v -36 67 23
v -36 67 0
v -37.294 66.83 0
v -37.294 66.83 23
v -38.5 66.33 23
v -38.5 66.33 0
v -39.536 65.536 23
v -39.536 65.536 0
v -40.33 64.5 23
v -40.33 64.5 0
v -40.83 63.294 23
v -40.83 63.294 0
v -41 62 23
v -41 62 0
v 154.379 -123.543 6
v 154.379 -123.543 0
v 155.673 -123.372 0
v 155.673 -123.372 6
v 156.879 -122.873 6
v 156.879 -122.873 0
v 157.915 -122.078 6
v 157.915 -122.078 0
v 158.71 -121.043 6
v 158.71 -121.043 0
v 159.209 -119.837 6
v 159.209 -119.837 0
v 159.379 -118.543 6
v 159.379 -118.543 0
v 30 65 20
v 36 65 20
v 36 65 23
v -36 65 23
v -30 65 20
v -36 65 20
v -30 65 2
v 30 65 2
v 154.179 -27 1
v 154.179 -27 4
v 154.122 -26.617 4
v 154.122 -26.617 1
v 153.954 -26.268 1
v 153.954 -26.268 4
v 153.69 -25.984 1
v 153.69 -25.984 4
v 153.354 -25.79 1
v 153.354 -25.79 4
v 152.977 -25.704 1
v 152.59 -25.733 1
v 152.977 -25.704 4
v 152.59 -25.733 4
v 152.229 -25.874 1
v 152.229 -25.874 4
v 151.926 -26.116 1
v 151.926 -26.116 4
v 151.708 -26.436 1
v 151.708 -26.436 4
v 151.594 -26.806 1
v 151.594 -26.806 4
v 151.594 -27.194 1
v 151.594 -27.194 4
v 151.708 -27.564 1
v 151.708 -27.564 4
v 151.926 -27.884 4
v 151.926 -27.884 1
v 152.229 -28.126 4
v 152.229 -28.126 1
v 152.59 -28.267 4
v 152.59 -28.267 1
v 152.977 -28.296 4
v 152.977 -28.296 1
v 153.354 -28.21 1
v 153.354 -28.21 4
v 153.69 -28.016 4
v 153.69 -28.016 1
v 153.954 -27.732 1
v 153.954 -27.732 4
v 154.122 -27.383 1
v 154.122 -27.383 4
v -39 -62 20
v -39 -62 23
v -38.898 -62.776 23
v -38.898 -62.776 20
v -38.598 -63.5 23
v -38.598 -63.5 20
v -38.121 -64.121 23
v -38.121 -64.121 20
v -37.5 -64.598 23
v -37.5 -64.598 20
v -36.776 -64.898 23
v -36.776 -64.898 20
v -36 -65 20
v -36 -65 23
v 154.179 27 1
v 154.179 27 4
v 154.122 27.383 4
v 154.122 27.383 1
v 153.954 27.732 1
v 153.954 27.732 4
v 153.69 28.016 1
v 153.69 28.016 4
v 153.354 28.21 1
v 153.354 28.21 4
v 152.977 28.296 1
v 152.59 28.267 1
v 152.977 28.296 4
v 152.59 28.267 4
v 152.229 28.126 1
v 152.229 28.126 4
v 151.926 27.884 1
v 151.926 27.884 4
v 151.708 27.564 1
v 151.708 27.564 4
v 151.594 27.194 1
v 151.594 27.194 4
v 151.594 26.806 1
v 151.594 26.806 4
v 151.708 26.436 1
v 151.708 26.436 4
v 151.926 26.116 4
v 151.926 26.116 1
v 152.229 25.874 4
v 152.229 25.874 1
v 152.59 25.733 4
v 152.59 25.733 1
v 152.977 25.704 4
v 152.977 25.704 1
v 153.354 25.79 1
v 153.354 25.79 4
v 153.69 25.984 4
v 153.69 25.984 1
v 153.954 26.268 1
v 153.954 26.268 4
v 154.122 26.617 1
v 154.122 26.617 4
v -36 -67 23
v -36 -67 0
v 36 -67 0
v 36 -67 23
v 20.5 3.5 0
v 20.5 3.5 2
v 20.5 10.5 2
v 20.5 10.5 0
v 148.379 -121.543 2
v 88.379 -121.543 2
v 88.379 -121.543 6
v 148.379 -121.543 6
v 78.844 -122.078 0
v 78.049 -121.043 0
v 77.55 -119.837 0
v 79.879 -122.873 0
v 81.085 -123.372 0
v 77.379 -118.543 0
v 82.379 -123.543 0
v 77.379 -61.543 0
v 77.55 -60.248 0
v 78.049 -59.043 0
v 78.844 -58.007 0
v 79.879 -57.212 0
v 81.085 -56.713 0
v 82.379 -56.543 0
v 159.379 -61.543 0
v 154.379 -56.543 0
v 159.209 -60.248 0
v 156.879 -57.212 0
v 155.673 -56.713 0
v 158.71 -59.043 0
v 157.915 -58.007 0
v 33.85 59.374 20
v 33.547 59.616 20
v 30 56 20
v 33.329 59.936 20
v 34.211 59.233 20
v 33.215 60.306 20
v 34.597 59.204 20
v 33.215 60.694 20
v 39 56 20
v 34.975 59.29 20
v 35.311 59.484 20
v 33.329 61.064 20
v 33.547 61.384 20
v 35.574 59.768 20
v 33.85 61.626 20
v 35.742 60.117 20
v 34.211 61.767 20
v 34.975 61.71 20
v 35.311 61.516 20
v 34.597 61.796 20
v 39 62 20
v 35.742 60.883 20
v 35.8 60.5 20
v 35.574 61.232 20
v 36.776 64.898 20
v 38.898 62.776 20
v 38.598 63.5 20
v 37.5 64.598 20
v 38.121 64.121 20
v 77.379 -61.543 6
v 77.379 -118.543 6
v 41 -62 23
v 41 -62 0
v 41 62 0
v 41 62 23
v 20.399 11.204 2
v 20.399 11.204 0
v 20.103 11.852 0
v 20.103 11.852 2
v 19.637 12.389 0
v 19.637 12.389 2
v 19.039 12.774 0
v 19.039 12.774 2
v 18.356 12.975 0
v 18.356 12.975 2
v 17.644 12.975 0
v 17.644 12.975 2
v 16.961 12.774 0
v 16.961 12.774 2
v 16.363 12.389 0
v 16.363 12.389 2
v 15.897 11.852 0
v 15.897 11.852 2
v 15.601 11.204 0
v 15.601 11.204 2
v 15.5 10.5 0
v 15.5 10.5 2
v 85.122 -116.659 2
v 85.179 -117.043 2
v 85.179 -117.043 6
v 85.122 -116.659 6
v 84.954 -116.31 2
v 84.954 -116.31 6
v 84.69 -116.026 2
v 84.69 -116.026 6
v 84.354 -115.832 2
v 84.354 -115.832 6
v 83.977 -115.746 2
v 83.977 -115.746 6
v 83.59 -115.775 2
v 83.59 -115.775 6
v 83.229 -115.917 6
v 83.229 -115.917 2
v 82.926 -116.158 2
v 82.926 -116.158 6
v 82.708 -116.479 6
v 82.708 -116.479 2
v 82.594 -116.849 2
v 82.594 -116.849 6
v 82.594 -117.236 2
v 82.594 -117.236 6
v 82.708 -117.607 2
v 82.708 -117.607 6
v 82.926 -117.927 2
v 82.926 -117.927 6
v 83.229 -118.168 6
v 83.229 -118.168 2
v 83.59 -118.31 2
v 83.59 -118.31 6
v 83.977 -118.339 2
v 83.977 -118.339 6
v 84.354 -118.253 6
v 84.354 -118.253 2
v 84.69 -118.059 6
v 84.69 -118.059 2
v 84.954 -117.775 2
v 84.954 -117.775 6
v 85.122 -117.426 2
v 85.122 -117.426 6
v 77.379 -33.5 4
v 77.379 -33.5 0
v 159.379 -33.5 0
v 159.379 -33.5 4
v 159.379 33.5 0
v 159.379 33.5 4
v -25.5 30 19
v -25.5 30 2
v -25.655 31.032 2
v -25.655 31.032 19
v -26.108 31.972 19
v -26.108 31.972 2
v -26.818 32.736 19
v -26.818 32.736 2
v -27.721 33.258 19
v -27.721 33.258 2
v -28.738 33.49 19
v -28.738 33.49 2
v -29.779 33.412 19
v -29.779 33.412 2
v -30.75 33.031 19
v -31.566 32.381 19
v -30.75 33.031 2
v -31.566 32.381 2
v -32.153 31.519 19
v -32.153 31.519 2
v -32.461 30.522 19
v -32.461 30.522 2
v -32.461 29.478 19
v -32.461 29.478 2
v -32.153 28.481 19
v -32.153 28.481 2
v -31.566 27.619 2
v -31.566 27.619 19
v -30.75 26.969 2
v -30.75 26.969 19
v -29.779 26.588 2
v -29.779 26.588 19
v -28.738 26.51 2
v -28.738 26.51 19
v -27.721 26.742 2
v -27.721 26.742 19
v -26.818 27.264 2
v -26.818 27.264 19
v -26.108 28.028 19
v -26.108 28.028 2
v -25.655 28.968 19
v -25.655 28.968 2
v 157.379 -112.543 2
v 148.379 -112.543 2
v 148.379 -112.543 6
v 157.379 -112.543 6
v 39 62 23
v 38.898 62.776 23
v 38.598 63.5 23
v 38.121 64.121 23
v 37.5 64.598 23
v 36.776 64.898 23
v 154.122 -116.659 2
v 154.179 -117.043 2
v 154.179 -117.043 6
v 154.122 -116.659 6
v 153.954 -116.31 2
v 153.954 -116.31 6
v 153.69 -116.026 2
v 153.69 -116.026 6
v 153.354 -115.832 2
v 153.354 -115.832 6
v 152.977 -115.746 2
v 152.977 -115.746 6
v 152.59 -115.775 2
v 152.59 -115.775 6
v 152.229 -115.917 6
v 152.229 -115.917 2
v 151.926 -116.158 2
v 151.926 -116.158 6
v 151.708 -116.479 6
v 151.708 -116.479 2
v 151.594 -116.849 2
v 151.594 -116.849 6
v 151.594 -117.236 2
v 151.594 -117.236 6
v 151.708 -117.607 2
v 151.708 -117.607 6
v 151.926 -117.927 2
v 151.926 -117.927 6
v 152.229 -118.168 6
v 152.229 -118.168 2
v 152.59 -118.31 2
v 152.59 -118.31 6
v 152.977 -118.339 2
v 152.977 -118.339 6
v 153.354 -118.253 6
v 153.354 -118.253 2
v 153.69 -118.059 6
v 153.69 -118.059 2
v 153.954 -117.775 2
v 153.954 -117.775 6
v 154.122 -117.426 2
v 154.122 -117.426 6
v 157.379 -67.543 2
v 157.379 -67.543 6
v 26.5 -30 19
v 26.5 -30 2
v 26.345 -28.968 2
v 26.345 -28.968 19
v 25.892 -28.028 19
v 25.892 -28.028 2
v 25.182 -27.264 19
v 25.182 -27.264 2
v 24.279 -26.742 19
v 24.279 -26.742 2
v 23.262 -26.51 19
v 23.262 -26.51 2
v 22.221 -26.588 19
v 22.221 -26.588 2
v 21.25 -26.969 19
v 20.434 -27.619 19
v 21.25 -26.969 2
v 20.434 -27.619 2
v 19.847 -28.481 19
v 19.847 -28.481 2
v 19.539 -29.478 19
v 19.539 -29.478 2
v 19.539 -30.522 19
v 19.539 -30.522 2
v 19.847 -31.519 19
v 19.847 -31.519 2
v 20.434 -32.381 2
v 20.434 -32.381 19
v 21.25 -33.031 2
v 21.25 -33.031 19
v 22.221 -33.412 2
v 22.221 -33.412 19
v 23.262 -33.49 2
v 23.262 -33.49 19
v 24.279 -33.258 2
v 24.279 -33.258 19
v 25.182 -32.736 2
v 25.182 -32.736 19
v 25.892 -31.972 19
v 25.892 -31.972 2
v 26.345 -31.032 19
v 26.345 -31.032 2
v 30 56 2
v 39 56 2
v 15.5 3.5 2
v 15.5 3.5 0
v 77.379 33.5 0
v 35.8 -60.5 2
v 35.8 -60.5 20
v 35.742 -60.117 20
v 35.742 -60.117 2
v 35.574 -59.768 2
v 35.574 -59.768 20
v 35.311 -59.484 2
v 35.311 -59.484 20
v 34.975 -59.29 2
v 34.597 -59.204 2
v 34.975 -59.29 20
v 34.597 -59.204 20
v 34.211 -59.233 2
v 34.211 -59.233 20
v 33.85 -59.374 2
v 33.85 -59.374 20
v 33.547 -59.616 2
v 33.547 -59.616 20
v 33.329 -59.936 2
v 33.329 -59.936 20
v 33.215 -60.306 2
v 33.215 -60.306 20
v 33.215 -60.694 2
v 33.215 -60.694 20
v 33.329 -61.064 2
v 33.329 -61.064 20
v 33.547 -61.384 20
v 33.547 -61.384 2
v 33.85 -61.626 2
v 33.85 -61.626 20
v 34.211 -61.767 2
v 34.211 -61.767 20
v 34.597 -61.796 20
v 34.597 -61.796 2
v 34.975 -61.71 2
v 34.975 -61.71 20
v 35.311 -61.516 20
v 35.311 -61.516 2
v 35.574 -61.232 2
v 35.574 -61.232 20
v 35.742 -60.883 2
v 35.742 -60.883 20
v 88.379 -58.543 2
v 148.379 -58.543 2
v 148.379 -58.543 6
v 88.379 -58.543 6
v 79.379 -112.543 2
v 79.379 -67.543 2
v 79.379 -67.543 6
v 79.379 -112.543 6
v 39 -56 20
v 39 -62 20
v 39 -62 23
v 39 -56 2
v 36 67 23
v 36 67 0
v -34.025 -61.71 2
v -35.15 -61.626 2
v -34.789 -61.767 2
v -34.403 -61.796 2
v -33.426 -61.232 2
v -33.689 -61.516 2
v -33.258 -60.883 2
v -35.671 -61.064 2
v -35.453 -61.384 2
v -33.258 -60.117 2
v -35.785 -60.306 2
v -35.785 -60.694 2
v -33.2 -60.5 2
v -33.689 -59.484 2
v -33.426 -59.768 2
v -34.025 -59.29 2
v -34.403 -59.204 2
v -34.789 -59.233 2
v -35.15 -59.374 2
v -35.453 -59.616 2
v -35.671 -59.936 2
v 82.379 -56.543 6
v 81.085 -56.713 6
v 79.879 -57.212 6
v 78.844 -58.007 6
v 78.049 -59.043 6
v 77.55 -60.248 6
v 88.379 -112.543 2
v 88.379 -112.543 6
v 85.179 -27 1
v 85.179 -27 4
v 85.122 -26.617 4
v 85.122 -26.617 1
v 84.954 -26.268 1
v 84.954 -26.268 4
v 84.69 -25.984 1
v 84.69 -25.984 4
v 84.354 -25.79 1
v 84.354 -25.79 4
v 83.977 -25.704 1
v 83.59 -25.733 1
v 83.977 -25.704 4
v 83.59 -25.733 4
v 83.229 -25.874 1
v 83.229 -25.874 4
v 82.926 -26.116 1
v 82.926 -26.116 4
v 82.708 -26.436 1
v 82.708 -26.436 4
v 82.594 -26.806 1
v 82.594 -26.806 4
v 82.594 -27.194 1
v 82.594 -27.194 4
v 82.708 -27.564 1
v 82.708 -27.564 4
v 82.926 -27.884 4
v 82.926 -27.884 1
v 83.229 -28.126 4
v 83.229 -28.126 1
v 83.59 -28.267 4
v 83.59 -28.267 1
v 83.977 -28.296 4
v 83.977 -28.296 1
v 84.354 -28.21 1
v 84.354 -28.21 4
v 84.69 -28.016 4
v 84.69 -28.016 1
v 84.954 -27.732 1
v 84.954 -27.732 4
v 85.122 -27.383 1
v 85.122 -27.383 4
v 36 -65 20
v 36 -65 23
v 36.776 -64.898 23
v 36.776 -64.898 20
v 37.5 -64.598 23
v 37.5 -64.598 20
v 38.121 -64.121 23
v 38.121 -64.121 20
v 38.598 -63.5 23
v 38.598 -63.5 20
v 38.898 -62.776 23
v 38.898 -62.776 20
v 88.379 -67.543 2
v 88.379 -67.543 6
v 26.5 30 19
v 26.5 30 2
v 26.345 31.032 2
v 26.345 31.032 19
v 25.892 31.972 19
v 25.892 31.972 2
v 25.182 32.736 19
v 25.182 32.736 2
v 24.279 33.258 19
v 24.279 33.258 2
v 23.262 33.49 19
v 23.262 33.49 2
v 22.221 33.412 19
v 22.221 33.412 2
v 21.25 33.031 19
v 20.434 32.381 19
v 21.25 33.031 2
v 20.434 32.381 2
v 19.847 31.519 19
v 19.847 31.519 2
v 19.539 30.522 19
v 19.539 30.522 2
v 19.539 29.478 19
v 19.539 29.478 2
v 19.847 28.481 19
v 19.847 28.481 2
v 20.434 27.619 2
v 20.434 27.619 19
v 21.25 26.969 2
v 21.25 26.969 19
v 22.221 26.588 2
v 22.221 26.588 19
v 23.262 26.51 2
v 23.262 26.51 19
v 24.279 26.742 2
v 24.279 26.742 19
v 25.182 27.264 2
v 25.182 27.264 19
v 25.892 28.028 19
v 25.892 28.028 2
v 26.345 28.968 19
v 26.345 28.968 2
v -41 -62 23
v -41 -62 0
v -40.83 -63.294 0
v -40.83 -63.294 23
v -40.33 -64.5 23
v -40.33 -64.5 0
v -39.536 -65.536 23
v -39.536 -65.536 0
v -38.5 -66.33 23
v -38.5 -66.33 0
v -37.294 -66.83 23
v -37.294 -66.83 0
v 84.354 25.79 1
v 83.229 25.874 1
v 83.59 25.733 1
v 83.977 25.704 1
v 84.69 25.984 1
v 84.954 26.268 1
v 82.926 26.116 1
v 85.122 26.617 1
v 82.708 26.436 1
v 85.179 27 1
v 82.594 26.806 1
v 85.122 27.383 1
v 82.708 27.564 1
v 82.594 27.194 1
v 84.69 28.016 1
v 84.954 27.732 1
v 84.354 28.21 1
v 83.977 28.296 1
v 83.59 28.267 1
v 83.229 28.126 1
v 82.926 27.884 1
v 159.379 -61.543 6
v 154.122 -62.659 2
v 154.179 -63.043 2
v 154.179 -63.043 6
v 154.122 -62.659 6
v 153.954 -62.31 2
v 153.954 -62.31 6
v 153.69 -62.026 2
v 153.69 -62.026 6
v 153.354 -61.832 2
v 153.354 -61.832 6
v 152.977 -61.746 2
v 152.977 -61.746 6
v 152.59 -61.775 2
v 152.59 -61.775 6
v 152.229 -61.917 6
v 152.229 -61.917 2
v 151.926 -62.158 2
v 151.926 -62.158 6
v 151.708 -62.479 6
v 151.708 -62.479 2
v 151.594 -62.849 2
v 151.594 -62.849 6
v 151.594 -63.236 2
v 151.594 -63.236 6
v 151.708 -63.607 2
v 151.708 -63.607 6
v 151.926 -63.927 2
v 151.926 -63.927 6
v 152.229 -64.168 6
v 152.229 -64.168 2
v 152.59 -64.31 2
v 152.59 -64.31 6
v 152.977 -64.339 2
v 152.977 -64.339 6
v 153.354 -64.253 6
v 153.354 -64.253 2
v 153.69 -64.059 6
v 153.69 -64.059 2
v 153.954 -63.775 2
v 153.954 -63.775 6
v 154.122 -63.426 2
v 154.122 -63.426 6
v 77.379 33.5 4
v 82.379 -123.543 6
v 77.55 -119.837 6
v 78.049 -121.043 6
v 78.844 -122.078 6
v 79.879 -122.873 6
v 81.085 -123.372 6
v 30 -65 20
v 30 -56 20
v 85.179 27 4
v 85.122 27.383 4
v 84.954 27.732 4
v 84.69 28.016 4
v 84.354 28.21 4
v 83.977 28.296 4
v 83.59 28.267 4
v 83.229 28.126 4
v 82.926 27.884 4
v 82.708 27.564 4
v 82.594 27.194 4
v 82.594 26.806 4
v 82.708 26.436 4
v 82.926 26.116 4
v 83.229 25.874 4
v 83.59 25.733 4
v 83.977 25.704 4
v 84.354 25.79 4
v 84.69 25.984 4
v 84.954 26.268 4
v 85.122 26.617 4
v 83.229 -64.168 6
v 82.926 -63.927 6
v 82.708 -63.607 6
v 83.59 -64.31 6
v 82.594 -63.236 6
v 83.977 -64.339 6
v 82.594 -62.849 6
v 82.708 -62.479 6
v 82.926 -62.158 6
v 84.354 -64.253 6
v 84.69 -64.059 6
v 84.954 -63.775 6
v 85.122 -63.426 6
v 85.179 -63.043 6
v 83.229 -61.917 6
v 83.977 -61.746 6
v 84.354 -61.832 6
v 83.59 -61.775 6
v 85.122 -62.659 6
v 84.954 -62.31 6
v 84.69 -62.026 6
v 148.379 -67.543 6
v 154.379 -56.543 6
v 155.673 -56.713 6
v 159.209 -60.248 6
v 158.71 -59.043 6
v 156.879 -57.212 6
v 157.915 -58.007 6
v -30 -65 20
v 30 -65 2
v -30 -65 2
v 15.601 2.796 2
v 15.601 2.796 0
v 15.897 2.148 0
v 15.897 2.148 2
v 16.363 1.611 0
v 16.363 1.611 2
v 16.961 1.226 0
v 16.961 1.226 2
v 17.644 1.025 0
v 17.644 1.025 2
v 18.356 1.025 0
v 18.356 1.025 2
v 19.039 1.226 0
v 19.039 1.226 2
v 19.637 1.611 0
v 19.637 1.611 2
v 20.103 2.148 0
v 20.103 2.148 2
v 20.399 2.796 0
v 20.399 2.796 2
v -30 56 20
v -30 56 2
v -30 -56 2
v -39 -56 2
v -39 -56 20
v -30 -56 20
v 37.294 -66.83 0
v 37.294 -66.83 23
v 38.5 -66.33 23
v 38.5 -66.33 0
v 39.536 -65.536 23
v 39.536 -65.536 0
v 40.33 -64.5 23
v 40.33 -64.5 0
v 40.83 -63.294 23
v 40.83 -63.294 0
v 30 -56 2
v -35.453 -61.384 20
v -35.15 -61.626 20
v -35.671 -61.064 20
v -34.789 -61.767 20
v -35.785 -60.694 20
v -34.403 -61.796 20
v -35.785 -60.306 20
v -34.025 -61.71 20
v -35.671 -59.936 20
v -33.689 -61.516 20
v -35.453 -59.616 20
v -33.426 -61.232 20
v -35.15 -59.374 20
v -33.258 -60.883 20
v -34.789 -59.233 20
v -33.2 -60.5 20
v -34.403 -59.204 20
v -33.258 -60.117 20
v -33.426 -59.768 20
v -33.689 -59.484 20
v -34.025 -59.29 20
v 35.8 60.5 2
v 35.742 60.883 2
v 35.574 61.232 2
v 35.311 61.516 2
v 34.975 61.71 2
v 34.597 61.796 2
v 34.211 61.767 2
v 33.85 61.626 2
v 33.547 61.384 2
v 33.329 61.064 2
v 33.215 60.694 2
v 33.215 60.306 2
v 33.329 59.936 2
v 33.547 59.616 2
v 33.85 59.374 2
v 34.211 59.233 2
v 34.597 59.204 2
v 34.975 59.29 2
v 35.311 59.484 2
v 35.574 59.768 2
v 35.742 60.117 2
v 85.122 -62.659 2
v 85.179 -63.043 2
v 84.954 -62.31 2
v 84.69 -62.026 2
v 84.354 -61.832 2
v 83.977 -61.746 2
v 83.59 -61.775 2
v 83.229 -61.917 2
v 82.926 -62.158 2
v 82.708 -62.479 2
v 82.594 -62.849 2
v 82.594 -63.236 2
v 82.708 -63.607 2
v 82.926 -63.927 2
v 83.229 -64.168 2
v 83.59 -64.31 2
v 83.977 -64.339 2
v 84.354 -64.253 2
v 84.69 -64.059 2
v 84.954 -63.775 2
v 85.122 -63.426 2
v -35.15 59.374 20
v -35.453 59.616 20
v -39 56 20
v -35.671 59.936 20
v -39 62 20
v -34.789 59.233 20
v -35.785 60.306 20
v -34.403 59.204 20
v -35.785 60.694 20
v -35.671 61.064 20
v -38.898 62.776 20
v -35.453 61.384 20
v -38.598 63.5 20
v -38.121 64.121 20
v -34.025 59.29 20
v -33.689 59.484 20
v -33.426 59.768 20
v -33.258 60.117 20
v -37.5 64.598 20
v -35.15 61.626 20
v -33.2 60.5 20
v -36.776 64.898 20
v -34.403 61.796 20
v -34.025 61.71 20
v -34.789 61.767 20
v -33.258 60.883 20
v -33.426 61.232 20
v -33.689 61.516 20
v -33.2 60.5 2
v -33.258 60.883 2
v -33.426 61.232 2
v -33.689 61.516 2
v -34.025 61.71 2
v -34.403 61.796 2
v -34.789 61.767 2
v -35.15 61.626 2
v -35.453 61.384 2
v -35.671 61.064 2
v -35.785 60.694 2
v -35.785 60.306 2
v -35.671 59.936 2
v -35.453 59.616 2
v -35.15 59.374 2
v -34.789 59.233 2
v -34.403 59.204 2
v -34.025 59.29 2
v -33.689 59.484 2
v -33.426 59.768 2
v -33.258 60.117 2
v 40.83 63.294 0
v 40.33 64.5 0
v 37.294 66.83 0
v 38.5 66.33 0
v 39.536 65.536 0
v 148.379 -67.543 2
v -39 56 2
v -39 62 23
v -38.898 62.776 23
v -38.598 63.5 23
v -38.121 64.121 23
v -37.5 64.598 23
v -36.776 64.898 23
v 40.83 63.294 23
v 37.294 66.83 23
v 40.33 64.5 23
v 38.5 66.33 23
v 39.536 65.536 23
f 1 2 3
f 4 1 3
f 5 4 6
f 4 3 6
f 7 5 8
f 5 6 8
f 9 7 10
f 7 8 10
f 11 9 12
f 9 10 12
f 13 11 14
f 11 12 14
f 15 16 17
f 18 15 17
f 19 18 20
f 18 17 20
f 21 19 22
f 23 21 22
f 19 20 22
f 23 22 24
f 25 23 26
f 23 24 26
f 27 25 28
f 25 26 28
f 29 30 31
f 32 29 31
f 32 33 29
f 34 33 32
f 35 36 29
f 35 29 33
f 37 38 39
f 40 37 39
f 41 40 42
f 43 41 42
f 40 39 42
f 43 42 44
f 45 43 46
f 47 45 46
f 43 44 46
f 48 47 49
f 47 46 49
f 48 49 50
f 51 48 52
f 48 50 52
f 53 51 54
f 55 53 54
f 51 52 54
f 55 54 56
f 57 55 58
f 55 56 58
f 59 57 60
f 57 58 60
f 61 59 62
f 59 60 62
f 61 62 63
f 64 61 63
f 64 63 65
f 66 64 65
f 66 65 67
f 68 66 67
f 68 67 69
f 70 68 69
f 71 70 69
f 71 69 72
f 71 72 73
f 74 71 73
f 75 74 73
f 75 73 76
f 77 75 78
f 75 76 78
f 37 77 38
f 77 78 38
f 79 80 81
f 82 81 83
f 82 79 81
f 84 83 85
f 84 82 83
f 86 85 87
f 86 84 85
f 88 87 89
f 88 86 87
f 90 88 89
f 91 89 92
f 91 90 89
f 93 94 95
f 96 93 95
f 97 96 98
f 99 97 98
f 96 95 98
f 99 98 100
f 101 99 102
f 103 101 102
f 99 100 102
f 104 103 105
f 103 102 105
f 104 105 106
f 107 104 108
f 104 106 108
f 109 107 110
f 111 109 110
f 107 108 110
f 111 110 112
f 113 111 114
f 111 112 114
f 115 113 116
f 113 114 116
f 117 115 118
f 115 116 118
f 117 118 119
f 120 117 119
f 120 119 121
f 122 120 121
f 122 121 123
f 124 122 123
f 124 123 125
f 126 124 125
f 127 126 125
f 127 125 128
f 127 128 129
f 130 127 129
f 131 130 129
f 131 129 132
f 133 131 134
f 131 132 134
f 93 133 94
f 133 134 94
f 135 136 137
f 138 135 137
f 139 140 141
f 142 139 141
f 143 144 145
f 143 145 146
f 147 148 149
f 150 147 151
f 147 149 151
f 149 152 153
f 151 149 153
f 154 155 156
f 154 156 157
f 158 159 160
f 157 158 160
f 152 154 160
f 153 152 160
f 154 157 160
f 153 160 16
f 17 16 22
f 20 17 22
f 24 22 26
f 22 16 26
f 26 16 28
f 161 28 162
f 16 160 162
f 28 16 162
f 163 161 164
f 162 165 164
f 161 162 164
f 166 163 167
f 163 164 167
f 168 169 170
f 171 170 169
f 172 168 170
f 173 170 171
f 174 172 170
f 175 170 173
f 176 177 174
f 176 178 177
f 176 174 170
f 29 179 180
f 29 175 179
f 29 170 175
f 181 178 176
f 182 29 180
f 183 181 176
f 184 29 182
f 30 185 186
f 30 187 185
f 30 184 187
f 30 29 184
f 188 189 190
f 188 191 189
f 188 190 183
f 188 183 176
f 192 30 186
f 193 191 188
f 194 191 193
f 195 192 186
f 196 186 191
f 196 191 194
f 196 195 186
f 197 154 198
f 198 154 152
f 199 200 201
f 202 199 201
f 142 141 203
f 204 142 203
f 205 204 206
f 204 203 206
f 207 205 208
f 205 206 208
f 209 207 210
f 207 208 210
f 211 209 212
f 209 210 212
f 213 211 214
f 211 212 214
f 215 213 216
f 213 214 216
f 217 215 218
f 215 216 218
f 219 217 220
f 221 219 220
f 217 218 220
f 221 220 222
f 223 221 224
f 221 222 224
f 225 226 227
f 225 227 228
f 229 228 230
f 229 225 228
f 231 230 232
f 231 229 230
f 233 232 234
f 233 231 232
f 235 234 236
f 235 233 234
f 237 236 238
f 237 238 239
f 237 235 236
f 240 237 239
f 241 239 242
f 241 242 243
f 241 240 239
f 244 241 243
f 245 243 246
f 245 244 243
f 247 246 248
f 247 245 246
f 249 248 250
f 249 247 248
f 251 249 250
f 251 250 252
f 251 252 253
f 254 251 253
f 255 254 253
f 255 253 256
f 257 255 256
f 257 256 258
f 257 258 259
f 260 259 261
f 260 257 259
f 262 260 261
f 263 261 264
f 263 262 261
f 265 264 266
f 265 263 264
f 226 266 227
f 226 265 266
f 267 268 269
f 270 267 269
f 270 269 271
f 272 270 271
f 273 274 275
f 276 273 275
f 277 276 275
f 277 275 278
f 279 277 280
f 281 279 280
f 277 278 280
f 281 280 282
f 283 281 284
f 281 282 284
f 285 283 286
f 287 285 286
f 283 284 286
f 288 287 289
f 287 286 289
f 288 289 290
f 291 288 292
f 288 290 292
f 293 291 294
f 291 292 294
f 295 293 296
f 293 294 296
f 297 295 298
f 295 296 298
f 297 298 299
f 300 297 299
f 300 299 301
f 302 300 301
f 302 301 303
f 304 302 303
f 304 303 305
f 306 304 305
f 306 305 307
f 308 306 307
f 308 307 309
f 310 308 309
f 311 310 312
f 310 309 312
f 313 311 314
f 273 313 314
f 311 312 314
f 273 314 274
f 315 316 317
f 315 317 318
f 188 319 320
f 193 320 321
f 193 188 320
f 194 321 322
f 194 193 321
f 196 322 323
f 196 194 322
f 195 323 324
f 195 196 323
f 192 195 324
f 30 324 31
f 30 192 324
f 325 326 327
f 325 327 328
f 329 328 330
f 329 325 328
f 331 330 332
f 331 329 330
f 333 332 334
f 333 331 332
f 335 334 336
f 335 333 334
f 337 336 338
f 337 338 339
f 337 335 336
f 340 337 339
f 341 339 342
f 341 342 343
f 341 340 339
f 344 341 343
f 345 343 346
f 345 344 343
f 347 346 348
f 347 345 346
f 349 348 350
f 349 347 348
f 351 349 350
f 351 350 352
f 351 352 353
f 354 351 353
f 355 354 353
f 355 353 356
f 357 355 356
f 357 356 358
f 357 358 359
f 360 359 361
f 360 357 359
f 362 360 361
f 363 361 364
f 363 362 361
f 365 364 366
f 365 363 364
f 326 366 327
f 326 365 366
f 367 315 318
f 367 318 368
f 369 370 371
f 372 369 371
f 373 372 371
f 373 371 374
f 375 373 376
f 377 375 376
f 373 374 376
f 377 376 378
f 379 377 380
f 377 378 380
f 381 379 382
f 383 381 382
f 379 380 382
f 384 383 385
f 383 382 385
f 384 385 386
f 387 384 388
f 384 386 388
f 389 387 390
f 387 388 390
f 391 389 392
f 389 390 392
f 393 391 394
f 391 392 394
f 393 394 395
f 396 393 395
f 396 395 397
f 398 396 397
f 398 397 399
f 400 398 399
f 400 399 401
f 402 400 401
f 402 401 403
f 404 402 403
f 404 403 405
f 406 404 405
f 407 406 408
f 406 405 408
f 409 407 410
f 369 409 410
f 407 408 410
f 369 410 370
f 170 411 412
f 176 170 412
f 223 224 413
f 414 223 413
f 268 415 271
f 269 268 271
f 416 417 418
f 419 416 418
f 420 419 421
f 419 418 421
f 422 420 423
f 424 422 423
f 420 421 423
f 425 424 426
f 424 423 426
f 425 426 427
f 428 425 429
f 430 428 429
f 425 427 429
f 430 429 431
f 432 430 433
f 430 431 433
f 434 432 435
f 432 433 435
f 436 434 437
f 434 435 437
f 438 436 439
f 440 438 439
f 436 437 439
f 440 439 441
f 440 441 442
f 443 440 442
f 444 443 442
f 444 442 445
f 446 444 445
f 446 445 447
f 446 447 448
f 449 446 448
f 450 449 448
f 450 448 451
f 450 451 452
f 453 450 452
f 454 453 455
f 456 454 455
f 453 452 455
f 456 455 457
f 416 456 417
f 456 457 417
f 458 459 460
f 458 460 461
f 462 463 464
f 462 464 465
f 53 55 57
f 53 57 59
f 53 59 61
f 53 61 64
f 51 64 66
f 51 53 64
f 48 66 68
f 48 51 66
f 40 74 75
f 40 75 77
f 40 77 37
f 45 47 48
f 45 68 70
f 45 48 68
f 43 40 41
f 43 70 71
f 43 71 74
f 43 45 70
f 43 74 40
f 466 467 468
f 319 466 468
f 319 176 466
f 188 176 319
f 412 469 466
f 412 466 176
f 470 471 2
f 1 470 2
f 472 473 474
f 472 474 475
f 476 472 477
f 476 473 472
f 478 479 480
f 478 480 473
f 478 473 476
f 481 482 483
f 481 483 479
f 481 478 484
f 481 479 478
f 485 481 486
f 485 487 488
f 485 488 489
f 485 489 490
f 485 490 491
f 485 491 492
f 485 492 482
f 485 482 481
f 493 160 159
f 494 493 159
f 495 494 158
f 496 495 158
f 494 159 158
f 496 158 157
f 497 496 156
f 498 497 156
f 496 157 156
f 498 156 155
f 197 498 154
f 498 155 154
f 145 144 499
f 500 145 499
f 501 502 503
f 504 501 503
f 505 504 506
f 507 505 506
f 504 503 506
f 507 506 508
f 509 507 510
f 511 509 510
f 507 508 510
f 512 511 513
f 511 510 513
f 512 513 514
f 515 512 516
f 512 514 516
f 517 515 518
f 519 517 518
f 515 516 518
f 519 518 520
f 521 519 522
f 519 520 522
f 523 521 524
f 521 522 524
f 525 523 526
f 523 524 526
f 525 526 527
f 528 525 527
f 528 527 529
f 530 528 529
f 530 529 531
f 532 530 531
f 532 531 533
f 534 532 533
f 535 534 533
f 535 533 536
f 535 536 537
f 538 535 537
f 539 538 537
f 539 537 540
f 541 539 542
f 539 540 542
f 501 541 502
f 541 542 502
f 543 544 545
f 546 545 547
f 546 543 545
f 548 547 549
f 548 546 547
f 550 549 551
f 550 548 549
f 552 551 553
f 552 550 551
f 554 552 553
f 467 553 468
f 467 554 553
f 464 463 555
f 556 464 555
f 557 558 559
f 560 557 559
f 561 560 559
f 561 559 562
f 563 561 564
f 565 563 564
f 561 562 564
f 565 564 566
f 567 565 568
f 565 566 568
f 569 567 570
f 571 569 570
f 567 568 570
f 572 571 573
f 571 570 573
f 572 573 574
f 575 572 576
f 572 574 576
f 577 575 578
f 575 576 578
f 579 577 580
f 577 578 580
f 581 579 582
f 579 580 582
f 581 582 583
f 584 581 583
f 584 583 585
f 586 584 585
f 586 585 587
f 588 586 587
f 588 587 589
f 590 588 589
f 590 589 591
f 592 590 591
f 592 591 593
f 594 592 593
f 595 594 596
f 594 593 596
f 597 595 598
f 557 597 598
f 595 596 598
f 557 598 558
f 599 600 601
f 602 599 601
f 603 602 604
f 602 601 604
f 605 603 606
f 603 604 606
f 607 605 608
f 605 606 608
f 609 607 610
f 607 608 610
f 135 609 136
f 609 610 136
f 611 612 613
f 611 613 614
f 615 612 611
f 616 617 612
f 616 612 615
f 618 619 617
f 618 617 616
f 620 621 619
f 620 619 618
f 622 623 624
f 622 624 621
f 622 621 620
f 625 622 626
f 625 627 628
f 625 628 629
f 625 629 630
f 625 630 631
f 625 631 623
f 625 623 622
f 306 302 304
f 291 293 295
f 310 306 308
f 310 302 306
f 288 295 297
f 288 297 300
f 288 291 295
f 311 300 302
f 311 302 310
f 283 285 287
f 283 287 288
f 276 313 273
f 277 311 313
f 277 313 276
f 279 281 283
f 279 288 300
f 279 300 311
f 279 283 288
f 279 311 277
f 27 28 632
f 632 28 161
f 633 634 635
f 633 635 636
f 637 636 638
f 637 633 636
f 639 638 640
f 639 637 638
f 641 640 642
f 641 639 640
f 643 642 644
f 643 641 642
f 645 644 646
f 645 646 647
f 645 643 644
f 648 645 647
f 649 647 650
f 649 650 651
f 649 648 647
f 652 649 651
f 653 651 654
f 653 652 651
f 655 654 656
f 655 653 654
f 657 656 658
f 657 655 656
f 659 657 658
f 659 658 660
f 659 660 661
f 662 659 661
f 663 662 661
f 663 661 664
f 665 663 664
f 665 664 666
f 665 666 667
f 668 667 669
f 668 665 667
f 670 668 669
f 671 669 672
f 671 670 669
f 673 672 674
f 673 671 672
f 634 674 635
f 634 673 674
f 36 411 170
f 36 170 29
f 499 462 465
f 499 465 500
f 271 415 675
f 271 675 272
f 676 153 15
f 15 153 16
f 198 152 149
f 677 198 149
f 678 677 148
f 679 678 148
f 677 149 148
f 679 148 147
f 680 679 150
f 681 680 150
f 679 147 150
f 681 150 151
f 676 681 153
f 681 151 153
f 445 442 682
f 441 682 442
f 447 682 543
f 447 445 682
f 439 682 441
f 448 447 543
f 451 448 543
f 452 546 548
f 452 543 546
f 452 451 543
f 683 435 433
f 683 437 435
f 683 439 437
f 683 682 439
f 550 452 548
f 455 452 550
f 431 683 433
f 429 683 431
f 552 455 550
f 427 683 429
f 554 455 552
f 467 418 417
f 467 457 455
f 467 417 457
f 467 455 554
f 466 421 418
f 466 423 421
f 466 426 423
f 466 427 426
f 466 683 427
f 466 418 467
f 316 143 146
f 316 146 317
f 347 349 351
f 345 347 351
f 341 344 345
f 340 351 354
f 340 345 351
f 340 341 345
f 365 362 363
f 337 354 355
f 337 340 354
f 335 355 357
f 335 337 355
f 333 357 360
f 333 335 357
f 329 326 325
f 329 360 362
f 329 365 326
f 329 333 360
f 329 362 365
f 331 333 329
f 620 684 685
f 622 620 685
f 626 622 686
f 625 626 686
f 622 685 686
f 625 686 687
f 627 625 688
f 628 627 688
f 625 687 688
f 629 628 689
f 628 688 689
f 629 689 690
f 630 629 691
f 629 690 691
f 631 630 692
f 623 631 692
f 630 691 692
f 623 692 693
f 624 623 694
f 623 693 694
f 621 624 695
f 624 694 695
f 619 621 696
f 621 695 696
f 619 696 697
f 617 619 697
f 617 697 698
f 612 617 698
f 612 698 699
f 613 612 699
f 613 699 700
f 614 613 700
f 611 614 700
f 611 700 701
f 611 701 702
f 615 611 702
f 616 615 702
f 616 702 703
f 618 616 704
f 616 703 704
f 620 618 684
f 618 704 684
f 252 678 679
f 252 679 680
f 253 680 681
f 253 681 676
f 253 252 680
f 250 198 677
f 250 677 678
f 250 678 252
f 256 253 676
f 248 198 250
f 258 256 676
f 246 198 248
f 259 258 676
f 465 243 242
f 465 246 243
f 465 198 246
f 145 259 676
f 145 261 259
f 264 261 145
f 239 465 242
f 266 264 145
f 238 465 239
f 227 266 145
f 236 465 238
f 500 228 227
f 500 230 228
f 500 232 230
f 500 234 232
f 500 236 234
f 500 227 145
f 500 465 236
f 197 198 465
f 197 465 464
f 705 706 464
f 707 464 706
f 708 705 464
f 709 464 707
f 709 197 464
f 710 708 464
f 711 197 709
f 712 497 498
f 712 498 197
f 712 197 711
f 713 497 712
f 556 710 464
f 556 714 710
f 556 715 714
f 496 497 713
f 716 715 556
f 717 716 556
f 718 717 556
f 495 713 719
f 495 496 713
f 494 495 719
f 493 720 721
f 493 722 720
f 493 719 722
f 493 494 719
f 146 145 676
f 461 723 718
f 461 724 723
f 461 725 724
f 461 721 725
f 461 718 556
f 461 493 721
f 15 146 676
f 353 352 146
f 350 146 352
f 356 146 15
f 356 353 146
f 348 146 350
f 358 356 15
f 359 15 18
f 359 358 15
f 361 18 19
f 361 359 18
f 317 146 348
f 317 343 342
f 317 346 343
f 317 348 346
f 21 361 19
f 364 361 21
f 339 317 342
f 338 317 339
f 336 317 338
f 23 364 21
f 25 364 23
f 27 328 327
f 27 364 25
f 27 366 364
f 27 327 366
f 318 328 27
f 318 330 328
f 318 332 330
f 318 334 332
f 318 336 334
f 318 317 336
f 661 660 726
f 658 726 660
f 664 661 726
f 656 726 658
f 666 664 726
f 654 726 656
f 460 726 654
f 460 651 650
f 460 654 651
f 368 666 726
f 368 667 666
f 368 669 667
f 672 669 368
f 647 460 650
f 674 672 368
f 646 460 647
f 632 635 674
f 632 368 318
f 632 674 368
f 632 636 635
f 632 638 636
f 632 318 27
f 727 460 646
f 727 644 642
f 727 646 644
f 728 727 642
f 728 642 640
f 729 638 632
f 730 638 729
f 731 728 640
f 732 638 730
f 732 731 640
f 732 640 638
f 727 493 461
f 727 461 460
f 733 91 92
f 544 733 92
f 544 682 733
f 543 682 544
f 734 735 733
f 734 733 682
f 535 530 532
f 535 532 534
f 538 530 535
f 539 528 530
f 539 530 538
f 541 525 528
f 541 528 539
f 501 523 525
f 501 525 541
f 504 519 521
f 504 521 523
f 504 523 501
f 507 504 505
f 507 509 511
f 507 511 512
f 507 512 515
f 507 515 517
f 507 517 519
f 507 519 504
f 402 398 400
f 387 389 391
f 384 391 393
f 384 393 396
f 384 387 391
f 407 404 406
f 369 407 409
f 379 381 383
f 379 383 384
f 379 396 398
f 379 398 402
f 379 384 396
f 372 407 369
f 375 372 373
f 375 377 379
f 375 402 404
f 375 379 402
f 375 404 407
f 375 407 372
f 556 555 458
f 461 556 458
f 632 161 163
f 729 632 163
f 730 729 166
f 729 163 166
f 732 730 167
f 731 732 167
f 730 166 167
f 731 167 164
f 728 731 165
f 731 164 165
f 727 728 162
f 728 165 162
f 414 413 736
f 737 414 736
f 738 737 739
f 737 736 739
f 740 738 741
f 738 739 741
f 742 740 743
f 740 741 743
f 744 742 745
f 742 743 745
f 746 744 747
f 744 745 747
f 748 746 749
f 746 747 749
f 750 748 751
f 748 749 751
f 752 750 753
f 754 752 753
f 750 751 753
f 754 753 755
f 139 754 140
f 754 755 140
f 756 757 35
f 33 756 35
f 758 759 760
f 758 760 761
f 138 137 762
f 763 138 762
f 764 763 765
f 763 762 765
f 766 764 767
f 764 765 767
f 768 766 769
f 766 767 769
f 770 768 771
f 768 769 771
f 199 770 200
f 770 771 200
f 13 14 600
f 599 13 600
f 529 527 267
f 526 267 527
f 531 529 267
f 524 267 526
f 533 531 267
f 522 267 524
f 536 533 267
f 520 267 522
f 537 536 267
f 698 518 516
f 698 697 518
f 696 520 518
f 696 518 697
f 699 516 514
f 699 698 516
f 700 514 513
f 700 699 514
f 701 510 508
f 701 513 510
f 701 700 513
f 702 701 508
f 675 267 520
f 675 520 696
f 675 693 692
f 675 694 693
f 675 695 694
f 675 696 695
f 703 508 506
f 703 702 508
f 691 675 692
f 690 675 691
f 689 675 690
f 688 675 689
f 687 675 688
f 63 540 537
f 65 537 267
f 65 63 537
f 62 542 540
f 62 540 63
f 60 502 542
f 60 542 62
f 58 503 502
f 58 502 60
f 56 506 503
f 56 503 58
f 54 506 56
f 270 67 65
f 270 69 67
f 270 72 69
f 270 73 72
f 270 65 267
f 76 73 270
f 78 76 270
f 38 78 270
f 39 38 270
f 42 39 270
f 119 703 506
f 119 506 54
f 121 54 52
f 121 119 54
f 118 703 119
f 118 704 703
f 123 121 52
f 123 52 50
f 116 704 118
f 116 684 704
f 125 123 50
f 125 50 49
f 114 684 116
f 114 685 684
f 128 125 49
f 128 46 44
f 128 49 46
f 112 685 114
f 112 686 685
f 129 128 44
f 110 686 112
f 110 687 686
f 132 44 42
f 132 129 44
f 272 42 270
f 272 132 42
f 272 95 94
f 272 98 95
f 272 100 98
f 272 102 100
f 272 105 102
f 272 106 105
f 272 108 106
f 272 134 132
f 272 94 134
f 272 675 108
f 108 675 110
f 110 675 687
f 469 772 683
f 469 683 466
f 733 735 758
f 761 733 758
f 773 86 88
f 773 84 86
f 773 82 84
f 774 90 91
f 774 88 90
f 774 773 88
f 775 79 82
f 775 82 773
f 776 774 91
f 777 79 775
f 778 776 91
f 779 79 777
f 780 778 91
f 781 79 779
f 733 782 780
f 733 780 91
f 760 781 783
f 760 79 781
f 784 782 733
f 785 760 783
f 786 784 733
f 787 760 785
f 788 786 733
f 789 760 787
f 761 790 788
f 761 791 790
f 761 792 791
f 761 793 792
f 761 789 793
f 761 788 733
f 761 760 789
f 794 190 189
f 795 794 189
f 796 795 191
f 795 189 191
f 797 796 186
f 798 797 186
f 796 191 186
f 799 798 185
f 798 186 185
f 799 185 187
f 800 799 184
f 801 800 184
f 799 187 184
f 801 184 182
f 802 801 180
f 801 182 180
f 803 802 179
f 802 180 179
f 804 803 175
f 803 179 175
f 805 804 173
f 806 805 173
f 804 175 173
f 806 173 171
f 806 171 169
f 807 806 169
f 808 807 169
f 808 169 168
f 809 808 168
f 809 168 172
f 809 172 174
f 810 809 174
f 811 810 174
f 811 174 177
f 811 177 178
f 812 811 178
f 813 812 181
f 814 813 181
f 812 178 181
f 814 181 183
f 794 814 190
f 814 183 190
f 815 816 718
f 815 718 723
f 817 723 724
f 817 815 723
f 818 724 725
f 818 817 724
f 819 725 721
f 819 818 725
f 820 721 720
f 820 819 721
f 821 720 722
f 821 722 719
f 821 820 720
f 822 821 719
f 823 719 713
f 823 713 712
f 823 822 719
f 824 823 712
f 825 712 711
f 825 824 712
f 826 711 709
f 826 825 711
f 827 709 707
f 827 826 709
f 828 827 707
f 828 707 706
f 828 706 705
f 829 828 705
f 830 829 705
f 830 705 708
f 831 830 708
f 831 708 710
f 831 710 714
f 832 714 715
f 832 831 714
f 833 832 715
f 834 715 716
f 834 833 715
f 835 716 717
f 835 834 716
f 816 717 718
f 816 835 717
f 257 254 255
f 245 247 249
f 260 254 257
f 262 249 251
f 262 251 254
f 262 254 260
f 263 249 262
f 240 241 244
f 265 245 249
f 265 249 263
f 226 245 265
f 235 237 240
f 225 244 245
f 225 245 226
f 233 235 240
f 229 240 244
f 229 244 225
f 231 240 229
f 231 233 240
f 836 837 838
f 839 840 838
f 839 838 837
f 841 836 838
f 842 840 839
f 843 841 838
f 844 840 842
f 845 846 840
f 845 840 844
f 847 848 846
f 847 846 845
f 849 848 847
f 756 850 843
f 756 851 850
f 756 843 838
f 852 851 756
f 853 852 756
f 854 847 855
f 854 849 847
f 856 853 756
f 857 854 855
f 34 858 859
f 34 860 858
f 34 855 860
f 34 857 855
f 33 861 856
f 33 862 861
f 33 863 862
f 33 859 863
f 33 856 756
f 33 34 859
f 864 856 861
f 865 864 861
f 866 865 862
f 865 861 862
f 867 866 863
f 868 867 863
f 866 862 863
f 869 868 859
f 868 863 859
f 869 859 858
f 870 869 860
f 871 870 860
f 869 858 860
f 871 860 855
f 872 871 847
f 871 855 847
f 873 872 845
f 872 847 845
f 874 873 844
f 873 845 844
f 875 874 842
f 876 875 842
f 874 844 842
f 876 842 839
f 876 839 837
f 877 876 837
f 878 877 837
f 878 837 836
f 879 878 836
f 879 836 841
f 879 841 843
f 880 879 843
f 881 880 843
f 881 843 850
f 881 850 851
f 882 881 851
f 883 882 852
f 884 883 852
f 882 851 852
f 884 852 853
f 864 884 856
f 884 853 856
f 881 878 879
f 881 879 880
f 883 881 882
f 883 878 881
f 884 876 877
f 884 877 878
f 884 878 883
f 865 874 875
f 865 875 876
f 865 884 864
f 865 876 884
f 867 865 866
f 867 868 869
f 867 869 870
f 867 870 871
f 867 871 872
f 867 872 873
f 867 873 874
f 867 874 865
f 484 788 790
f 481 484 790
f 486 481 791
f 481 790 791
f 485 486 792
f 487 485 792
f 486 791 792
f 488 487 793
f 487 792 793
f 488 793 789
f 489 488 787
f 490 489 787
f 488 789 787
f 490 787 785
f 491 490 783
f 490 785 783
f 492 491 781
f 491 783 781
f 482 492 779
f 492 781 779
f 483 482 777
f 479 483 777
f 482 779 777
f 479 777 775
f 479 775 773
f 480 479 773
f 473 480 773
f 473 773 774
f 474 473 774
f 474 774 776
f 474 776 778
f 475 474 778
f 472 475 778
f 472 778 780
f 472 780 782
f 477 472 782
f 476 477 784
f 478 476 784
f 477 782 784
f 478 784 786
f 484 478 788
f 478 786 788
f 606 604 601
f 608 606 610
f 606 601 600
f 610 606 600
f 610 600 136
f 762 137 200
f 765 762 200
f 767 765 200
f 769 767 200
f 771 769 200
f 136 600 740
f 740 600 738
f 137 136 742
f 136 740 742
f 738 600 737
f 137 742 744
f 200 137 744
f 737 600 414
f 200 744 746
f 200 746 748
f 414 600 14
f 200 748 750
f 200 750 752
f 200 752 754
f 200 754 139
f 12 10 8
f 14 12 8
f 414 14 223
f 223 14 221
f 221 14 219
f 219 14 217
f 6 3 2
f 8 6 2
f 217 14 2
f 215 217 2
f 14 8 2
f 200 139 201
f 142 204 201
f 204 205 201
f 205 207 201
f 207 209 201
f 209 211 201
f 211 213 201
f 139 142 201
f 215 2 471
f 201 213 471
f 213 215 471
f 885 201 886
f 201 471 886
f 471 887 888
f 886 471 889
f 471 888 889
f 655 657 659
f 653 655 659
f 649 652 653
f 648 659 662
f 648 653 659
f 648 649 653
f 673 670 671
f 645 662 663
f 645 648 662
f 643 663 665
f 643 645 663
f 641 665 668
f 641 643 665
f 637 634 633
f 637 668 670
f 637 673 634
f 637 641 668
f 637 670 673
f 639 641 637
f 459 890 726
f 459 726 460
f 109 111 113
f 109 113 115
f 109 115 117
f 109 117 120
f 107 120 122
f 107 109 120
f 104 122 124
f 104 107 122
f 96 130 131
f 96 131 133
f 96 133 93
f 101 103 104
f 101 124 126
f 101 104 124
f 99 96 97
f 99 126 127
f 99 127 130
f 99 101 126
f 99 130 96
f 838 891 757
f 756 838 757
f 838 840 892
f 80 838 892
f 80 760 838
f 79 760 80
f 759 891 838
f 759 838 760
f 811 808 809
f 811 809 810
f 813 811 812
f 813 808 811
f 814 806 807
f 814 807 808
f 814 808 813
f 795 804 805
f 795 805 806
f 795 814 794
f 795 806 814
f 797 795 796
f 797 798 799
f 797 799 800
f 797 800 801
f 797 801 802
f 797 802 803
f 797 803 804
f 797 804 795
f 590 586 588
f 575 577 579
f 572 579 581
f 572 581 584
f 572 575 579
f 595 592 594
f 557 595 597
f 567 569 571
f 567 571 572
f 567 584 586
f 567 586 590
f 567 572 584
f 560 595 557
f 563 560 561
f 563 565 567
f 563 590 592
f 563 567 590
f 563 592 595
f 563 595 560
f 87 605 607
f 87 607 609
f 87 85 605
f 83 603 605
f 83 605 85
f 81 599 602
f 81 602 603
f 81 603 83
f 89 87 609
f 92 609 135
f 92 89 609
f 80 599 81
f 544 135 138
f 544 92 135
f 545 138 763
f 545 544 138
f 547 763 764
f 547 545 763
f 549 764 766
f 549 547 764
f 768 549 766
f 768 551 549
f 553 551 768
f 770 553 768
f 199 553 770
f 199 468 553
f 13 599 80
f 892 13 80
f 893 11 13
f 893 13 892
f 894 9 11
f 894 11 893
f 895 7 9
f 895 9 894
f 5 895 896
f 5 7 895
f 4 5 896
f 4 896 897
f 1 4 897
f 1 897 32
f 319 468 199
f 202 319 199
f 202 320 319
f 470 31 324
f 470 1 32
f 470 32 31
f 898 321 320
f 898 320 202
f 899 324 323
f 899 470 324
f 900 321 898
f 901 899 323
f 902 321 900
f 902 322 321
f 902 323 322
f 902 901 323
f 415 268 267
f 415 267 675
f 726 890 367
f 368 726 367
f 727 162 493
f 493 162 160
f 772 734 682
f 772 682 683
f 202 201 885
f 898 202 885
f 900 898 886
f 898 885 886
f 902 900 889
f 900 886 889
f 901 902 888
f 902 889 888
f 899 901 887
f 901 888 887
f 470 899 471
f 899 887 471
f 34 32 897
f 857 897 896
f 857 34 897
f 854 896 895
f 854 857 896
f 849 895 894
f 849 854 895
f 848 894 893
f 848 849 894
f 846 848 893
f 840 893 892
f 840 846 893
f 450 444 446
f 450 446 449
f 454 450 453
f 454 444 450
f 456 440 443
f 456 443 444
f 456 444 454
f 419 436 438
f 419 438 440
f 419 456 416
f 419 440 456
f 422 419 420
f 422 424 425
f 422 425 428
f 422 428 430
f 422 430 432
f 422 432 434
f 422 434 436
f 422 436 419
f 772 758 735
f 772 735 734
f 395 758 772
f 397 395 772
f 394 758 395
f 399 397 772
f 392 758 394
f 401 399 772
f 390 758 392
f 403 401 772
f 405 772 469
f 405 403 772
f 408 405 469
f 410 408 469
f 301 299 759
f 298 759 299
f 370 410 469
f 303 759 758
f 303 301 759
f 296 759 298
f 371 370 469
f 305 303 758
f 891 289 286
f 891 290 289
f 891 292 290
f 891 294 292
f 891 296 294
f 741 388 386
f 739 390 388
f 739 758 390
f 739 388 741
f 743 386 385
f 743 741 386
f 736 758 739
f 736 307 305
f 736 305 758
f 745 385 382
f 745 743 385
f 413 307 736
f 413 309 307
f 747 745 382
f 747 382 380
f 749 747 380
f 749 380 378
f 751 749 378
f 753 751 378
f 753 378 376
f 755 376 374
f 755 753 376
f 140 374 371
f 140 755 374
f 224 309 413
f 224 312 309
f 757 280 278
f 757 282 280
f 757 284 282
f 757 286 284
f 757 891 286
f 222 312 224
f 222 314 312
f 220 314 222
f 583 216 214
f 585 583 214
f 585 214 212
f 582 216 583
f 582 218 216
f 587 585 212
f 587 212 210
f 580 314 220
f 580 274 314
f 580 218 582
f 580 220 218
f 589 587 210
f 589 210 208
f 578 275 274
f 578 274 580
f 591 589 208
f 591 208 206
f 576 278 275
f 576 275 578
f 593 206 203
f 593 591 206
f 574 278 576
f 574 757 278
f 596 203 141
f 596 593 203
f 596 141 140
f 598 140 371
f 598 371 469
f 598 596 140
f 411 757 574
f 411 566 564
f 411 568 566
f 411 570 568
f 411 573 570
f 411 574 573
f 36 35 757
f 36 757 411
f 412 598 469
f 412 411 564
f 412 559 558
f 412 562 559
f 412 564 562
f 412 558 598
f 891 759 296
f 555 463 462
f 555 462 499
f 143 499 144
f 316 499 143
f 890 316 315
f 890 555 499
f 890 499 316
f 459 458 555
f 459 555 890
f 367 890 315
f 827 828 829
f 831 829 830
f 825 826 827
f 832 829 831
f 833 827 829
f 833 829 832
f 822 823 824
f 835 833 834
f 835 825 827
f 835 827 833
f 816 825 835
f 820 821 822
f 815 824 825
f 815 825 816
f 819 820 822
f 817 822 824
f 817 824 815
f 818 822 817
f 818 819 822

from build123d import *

# Parameters (mm, degrees)
F1_DEPTH  = 23
F2_T      = -2
F3_W      = 9
F3_H      = 9
F4_DEPTH  = 18
F3_R      = 3.5
F5_DEPTH  = 17
F6_DEPTH  = 2
F7_R      = 1.3
F8_DEPTH  = 18
F9_W      = 82
F9_H      = 67
F10_DEPTH = 4
F11_DEPTH = 6
F12_T     = -2
F13_R     = 1.3
F14_DEPTH = 3
F15_W     = 9
F15_H     = 9
F15_R     = 1.3
F16_DEPTH = 4


with BuildPart() as f1:
    # F0 (on Top) → F1 (new body)
    with BuildSketch(Plane.XY):
        with BuildLine():
            Line((-36, -67), (36, -67))
            ThreePointArc((36, -67), (39.535534, -65.535534), (41, -62))
            Line((41, -62), (41, 62))
            ThreePointArc((41, 62), (39.535534, 65.535534), (36, 67))
            Line((36, 67), (-36, 67))
            ThreePointArc((-36, 67), (-39.535534, 65.535534), (-41, 62))
            Line((-41, 62), (-41, -62))
            ThreePointArc((-41, -62), (-39.535534, -65.535534), (-36, -67))
        make_face()
    extrude(amount=F1_DEPTH)

    # F2
    f2_openings = [f1.faces().sort_by_distance(p)[0] for p in [
        (0, 0, 23),
    ]]
    offset(amount=F2_T, openings=f2_openings)

    # F3 (on face) → F4 (join)
    with BuildSketch(Plane.XY.offset(2)):
        with Locations((-34.5, 60.5)):
            Rectangle(F3_W, F3_H)
        with Locations((34.5, 60.5)):
            Rectangle(F3_W, F3_H)
        with Locations((-34.5, -60.5)):
            Rectangle(F3_W, F3_H)
        with Locations((34.5, -60.5)):
            Rectangle(F3_W, F3_H)
    extrude(amount=F4_DEPTH)

    # F3 (on face) → F5 (join)
    with BuildSketch(Plane.XY.offset(2)):
        with Locations((-29, 30)):
            Circle(F3_R)
        with Locations((23, 30)):
            Circle(F3_R)
        with Locations((23, -30)):
            Circle(F3_R)
    extrude(amount=F5_DEPTH)

    # F3 (on face) → F6 (cut)
    with BuildSketch(Plane.XY.offset(2)):
        with BuildLine():
            ThreePointArc((15.5, 3.5), (18, 1), (20.5, 3.5))
            Line((20.5, 3.5), (20.5, 10.5))
            ThreePointArc((20.5, 10.5), (18, 13), (15.5, 10.5))
            Line((15.5, 10.5), (15.5, 3.5))
        make_face()
    extrude(amount=-F6_DEPTH, mode=Mode.SUBTRACT)

    # F7 (on face) → F8 (cut)
    with BuildSketch(Plane.XY.offset(20)):
        with Locations((-34.5, 60.5)):
            Circle(F7_R)
        with Locations((-34.5, -60.5)):
            Circle(F7_R)
        with Locations((34.5, 60.5)):
            Circle(F7_R)
        with Locations((34.5, -60.5)):
            Circle(F7_R)
    extrude(amount=-F8_DEPTH, mode=Mode.SUBTRACT)


with BuildPart() as f10:
    # F9 (on Top) → F10 (new body)
    with BuildSketch(Plane.XY):
        with Locations((118.379401, 0)):
            Rectangle(F9_W, F9_H)
    extrude(amount=F10_DEPTH)

    # F13 (on face) → F14 (cut)
    with BuildSketch(Plane.XY.offset(4)):
        with Locations((83.879401, 27)):
            Circle(F13_R)
        with Locations((152.879401, 27)):
            Circle(F13_R)
        with Locations((83.879401, -27)):
            Circle(F13_R)
        with Locations((152.879401, -27)):
            Circle(F13_R)
    extrude(amount=-F14_DEPTH, mode=Mode.SUBTRACT)


with BuildPart() as f11:
    # F9 (on Top) → F11 (new body)
    with BuildSketch(Plane.XY):
        with BuildLine():
            Line((82.379401, -123.542584), (154.379401, -123.542584))
            ThreePointArc((154.379401, -123.542584), (157.914935, -122.078118), (159.379401, -118.542584))
            Line((159.379401, -118.542584), (159.379401, -61.542584))
            ThreePointArc((159.379401, -61.542584), (157.914935, -58.00705), (154.379401, -56.542584))
            Line((154.379401, -56.542584), (82.379401, -56.542584))
            ThreePointArc((82.379401, -56.542584), (78.843868, -58.00705), (77.379401, -61.542584))
            Line((77.379401, -61.542584), (77.379401, -118.542584))
            ThreePointArc((77.379401, -118.542584), (78.843868, -122.078118), (82.379401, -123.542584))
        make_face()
    extrude(amount=F11_DEPTH)

    # F12
    f12_openings = [f11.faces().sort_by_distance(p)[0] for p in [
        (118.379401, -90.042584, 6),
    ]]
    offset(amount=F12_T, openings=f12_openings)

    # F15 (on face) → F16 (join)
    with BuildSketch(Plane.XY.offset(2)):
        with Locations((83.879401, -117.042584)):
            Rectangle(F15_W, F15_H)
        with Locations((83.879401, -117.042584)):
            Circle(F15_R, mode=Mode.SUBTRACT)
        with Locations((83.879401, -63.042584)):
            Rectangle(F15_W, F15_H)
        with Locations((83.879401, -63.042584)):
            Circle(F15_R, mode=Mode.SUBTRACT)
        with Locations((152.879401, -63.042584)):
            Rectangle(F15_W, F15_H)
        with Locations((152.879401, -63.042584)):
            Circle(F15_R, mode=Mode.SUBTRACT)
        with Locations((152.879401, -117.042584)):
            Rectangle(F15_W, F15_H)
        with Locations((152.879401, -117.042584)):
            Circle(F15_R, mode=Mode.SUBTRACT)
    extrude(amount=F16_DEPTH)


solid = Compound([f1.part, f10.part, f11.part])
